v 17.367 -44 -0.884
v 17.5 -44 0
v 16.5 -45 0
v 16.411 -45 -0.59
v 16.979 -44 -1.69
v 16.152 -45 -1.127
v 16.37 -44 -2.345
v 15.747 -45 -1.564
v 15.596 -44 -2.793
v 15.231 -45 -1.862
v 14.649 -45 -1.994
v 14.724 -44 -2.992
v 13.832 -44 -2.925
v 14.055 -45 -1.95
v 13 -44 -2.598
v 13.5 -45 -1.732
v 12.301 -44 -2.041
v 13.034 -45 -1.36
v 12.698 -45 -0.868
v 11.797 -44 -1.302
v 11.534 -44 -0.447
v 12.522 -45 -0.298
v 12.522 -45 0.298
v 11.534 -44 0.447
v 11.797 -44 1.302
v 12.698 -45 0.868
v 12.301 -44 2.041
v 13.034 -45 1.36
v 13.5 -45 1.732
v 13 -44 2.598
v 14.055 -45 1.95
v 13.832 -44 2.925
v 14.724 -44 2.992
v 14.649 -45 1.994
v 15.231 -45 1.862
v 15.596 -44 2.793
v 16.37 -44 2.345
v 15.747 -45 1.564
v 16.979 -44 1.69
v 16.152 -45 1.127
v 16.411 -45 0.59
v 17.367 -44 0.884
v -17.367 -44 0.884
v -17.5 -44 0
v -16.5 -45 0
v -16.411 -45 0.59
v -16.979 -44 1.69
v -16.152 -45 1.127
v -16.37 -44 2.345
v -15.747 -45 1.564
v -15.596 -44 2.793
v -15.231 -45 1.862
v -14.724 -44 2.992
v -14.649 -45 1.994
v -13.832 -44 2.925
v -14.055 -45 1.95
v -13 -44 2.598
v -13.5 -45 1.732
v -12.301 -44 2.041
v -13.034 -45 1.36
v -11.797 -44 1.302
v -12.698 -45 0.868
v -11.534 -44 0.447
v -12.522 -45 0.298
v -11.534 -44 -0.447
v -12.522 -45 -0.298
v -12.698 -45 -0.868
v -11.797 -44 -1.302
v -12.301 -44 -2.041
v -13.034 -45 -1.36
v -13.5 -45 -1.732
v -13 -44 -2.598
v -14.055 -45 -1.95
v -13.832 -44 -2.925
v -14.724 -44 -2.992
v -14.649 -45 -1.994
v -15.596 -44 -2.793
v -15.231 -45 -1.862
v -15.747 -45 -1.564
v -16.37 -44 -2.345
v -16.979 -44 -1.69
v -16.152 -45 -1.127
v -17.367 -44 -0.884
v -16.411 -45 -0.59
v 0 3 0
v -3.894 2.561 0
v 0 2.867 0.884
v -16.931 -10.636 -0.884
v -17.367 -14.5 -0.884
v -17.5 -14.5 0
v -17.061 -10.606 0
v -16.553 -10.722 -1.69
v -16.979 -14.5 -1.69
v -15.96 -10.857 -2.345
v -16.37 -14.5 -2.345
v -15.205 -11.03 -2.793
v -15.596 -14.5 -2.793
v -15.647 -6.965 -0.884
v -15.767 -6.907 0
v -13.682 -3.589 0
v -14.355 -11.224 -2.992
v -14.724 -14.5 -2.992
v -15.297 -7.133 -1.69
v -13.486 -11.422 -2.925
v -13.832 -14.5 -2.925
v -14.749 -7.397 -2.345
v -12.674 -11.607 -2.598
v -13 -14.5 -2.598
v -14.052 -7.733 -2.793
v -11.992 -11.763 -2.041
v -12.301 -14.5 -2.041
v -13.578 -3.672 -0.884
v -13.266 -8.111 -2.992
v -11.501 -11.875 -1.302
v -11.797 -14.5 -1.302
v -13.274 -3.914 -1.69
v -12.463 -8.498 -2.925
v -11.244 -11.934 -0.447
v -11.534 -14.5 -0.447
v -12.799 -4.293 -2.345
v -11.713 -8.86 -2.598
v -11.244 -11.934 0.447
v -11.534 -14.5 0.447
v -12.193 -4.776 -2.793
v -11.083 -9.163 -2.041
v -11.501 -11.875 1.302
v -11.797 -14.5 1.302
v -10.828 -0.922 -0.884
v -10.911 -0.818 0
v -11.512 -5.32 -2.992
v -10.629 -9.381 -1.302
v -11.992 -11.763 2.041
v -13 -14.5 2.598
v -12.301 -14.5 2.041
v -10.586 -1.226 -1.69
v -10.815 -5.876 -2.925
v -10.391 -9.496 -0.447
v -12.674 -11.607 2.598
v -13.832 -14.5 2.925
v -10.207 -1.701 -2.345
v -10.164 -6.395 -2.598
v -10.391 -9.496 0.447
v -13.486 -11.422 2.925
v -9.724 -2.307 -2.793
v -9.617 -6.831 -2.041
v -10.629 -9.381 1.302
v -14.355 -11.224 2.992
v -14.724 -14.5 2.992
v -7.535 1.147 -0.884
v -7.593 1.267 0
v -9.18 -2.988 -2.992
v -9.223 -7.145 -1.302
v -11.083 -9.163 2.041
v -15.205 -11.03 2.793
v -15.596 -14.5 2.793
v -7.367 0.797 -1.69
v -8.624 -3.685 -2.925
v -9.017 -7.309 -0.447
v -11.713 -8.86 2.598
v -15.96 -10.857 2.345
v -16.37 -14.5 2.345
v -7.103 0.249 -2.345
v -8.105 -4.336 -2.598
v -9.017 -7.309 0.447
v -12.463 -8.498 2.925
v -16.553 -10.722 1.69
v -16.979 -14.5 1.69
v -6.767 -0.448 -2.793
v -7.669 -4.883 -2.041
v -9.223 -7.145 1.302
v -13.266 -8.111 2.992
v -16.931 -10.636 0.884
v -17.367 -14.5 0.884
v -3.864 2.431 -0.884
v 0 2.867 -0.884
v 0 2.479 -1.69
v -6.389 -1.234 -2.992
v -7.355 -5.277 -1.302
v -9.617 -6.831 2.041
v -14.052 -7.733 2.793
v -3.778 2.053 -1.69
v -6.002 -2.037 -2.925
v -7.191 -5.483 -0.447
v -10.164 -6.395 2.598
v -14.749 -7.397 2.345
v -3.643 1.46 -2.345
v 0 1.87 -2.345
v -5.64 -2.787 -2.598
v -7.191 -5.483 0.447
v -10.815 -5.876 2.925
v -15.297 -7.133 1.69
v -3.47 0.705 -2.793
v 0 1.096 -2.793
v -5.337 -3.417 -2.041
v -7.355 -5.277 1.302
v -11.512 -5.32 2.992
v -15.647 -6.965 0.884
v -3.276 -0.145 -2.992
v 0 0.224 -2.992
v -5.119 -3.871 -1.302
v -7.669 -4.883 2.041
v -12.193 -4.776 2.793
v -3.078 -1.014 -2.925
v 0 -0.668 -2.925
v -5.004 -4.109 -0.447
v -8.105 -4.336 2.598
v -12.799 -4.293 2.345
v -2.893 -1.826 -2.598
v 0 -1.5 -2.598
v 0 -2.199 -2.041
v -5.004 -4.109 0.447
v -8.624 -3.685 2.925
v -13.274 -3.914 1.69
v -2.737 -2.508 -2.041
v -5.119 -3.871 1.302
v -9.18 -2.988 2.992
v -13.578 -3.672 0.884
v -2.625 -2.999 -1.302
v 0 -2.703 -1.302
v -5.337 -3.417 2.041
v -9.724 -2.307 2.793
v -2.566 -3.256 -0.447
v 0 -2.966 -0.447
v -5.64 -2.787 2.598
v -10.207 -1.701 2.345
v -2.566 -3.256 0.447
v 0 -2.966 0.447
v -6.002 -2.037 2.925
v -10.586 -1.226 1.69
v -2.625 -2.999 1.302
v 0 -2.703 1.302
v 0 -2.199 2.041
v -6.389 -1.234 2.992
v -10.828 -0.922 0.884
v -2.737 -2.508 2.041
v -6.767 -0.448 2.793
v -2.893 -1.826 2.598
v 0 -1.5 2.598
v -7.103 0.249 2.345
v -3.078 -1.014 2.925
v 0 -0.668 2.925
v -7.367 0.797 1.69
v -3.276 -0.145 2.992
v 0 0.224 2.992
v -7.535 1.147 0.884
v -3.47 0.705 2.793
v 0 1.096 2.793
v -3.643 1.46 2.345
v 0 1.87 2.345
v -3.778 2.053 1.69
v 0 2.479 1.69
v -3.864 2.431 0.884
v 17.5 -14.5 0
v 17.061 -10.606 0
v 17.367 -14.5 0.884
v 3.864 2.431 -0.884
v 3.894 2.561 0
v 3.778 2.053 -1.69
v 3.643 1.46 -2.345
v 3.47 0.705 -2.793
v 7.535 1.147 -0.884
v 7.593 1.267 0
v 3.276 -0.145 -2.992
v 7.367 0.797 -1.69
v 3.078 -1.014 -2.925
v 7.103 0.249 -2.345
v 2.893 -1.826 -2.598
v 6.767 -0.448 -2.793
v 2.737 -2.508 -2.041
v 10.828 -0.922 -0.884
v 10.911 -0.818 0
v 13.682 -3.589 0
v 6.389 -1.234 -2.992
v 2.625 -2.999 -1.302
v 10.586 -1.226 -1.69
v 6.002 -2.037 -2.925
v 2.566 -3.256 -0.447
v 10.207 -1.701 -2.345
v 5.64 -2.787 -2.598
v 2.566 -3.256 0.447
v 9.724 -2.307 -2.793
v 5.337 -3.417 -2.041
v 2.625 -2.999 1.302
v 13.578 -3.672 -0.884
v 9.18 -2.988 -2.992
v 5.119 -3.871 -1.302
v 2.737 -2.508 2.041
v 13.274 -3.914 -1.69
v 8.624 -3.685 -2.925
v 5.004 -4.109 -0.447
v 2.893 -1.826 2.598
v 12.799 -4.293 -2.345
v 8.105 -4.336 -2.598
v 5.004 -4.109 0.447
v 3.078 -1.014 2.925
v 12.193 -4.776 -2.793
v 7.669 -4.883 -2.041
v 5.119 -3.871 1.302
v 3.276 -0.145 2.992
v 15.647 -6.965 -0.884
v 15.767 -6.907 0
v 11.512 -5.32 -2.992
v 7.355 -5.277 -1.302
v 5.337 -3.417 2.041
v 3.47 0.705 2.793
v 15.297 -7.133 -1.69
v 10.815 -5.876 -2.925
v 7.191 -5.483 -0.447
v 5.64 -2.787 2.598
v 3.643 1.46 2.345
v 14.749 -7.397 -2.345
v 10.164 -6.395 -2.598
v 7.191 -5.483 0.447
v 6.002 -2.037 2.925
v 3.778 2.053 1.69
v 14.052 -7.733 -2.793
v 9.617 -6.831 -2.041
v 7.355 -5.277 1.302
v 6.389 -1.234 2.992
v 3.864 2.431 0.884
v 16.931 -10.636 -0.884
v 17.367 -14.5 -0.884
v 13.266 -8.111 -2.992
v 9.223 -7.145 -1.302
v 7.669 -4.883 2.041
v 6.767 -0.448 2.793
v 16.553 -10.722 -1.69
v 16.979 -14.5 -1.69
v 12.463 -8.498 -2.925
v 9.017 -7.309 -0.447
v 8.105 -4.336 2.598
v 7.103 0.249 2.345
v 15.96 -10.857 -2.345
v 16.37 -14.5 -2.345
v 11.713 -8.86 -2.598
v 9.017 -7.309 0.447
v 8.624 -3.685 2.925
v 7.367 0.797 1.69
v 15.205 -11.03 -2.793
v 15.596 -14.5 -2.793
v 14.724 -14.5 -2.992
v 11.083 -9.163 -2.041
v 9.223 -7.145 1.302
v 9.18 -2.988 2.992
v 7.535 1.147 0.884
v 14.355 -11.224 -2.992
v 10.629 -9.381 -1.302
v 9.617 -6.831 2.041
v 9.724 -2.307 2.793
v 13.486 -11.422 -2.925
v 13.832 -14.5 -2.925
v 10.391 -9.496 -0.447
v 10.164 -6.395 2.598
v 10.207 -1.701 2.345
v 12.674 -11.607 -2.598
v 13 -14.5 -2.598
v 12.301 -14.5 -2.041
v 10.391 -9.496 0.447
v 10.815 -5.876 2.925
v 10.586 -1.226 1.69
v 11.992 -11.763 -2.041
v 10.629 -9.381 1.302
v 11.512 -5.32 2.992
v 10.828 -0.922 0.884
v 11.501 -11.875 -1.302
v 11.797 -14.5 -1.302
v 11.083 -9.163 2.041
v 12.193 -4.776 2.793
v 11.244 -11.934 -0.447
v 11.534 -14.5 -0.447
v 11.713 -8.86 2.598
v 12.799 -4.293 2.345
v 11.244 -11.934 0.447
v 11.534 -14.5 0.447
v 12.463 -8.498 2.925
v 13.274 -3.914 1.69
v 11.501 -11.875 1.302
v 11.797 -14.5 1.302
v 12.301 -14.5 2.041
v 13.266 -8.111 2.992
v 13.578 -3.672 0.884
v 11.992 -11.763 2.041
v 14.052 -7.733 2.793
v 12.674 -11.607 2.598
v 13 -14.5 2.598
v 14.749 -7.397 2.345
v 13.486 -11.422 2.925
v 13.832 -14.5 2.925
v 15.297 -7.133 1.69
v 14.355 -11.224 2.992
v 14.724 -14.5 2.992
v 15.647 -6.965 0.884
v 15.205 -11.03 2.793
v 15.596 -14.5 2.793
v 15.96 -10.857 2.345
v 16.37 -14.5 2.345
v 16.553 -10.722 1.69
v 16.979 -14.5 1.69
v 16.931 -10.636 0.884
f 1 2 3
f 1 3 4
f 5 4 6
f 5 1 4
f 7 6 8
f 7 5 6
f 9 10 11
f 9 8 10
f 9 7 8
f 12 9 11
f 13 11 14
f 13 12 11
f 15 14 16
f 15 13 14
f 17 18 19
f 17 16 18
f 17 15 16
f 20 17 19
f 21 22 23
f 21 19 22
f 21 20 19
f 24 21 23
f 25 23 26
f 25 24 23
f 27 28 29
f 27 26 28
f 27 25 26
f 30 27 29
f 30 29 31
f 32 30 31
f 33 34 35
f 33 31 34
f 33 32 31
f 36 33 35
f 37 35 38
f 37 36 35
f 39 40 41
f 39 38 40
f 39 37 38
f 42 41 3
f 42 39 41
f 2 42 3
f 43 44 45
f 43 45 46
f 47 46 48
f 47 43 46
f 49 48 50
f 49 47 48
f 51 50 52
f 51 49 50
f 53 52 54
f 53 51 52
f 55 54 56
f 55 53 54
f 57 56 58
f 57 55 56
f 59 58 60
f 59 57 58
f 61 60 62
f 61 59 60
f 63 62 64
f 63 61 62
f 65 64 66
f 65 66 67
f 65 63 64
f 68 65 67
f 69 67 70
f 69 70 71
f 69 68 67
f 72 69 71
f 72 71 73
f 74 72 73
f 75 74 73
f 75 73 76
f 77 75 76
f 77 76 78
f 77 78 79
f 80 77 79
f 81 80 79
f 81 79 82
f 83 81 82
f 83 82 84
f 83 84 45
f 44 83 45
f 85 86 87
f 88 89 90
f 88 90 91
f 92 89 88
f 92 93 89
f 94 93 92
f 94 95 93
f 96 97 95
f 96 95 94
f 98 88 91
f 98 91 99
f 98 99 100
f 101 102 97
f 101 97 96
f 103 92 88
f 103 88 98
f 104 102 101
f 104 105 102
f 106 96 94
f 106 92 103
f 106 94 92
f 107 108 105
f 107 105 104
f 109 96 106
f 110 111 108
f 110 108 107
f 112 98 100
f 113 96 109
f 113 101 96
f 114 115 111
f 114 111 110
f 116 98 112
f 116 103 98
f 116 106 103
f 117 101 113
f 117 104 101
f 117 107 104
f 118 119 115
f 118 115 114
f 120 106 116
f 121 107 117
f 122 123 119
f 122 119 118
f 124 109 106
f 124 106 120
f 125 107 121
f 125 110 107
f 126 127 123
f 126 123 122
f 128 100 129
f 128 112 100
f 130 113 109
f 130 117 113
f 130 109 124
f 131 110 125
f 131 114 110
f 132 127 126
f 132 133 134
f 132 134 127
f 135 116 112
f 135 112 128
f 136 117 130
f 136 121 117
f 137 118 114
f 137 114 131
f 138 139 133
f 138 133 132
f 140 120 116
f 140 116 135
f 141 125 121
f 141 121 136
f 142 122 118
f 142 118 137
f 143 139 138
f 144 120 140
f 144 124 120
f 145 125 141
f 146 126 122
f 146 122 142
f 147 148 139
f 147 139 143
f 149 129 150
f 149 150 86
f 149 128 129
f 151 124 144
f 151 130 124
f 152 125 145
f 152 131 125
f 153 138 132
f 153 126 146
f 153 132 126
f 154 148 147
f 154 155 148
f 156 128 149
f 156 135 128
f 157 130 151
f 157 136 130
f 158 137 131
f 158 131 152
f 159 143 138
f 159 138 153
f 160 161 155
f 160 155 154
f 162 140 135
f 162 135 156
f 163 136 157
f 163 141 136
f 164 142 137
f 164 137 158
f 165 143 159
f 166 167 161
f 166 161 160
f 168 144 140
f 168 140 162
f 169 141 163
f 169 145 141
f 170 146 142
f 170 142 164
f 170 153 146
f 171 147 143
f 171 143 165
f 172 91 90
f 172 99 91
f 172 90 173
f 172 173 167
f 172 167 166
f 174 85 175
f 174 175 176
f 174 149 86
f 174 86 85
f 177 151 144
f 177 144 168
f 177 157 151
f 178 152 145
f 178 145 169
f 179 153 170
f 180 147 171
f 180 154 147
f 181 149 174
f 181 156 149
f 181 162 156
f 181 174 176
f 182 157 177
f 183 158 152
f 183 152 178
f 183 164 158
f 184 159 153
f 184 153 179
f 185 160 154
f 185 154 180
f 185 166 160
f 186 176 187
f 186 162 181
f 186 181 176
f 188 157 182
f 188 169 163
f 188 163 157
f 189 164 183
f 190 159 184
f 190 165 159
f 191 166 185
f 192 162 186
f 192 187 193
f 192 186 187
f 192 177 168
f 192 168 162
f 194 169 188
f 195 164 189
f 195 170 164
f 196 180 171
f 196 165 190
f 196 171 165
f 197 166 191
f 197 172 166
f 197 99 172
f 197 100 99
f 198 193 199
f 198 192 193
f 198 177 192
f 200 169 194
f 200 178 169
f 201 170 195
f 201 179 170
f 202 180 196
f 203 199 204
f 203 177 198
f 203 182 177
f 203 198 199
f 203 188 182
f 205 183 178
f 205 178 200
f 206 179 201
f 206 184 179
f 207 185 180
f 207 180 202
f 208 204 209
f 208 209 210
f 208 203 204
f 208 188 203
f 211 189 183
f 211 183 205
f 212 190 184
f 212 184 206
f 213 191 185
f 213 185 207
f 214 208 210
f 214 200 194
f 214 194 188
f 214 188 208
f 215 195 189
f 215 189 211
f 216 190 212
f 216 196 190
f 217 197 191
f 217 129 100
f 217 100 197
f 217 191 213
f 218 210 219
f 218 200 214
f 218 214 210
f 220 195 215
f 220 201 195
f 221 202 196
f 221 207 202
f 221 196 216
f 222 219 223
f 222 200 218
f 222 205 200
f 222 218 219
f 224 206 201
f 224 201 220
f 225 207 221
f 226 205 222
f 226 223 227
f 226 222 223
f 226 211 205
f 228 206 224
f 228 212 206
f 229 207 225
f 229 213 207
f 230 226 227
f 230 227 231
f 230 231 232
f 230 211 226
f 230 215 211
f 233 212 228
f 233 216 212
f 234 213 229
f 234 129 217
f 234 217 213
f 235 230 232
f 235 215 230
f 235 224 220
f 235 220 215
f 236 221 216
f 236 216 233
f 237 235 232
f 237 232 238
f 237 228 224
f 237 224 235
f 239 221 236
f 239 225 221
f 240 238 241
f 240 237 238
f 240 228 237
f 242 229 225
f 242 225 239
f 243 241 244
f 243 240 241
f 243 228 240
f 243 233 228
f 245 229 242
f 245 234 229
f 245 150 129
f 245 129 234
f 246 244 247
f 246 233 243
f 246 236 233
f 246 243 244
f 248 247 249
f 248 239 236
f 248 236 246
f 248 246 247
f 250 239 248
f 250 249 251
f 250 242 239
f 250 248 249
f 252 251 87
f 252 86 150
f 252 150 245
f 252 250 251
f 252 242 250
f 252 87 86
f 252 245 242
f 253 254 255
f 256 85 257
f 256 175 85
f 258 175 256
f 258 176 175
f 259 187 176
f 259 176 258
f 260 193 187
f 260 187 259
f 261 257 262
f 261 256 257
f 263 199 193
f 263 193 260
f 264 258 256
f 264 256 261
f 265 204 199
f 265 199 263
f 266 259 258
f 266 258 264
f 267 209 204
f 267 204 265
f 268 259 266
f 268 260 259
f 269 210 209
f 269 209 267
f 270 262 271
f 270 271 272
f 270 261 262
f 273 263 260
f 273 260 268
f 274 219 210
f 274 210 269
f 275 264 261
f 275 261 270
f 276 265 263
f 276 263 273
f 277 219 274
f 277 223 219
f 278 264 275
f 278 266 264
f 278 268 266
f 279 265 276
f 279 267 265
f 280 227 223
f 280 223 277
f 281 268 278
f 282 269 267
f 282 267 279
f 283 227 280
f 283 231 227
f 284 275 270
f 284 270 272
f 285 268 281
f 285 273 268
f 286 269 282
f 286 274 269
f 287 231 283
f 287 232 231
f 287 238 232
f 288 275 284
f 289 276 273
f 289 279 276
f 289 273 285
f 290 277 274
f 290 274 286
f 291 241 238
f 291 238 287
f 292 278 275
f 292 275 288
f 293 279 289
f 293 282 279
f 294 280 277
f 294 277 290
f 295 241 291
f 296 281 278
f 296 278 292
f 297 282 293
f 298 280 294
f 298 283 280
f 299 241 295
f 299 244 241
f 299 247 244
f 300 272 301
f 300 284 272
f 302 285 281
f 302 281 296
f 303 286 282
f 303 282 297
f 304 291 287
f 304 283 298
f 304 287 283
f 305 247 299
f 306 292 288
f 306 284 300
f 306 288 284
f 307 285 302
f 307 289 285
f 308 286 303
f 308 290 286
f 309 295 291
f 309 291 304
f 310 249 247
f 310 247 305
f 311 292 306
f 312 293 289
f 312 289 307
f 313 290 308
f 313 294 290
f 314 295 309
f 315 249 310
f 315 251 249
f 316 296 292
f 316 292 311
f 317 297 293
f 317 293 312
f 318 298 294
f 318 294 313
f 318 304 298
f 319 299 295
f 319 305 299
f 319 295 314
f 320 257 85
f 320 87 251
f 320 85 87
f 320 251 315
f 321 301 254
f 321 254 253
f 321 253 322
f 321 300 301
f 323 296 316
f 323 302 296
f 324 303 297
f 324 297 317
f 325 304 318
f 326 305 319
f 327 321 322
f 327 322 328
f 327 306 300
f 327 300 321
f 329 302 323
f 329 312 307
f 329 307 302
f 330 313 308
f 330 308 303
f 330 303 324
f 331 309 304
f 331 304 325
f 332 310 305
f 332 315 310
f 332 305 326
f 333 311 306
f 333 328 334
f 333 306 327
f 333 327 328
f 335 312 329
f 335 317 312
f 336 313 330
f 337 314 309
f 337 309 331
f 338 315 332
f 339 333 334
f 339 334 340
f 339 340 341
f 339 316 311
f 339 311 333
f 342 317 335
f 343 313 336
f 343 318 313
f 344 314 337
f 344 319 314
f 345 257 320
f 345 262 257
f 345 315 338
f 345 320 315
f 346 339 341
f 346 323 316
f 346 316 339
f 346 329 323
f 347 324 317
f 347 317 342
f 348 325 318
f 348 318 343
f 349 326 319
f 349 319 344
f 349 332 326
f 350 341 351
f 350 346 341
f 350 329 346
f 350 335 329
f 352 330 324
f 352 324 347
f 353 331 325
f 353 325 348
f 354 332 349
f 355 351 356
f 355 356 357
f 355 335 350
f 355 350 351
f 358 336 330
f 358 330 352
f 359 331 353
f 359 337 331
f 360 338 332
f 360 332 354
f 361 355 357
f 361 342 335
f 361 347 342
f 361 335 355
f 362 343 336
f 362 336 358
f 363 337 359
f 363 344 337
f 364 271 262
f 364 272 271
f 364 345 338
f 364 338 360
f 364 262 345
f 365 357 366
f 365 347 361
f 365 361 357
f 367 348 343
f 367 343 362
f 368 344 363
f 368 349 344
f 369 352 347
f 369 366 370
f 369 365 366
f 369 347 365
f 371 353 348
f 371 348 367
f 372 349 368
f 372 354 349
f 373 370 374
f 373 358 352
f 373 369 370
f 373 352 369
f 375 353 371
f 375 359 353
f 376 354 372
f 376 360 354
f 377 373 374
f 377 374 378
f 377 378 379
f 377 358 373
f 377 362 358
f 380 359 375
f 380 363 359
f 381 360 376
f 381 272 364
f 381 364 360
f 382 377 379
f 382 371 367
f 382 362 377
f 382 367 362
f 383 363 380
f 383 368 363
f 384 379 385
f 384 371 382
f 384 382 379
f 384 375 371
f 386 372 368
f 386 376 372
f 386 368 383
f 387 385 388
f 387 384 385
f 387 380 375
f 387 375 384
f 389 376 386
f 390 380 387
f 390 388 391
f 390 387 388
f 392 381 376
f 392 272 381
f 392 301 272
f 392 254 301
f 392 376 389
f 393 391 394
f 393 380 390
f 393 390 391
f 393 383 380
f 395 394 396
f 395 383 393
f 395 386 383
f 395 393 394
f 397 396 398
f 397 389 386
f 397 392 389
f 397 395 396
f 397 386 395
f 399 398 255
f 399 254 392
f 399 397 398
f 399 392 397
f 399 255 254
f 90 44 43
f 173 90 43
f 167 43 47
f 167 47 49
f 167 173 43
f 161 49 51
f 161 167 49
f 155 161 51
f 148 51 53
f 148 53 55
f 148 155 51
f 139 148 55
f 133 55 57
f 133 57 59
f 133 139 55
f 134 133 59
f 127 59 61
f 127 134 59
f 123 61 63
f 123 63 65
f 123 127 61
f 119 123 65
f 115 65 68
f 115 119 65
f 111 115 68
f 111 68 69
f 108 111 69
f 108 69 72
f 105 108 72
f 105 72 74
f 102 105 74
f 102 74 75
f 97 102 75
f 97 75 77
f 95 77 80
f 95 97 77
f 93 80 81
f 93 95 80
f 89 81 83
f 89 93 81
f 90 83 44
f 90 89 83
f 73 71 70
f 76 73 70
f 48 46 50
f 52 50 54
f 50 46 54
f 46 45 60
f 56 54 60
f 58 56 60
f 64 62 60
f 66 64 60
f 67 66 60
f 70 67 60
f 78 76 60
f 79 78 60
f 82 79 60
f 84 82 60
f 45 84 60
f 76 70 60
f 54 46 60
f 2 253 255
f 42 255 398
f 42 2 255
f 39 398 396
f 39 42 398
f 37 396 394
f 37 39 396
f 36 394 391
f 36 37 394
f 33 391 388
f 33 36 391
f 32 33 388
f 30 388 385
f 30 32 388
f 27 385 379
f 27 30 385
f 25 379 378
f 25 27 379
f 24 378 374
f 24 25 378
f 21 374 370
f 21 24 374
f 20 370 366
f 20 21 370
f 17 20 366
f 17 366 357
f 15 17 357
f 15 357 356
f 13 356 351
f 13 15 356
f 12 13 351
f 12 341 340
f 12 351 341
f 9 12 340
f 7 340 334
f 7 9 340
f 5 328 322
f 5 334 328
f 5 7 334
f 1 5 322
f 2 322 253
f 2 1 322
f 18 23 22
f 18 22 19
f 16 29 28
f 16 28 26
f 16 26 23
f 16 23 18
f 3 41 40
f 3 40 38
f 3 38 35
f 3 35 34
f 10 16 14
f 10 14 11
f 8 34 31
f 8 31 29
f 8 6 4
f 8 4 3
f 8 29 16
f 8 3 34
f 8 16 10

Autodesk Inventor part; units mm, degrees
ref_plane "YZ Plane" through (0, 0, 0) normal (1, 0, 0) x (0, 1, 0)
ref_plane "XZ Plane" through (0, 0, 0) normal (0, 1, 0) x (-1, 0, 0)
ref_plane "XY Plane" through (0, 0, 0) normal (0, 0, 1) x (1, 0, 0)
sketch "Náčrt5" plane through (0, 0, 0) normal (1, 0, 0) x (0, 1, 0)
  circle A0 centre (0, 0) radius 3
  dimension "d23" = 6
sketch "Náčrt6" plane through (0, 0, 0) normal (0, 0, 1) x (1, 0, 0)
  line L0 (-14.5, -45) -> (-14.5, -14.5)
  line L1 (0, 0) -> (0, 0)
  line L2 (14.5, -14.5) -> (14.5, -45)
  line L3 (-14.5, -45) -> (14.5, -45) construction
  arc A0 (0, 0) -> (-14.5, -14.5) centre (0, -14.5) ccw
  arc A1 (14.5, -14.5) -> (0, 0) centre (0, -14.5) ccw
  point P0 (0, 0)
  point P1 (14.5, 0)
  point P2 (0, 0)
  dimension "d46" = 29
  dimension "d47" = 45
  dimension "d48" = 14.5
sweep "Tažení4" add profiles "Náčrt5" path "Náčrt6"
chamfer "Zkosení4" distance 1 angle 45 5 edges at (-11.5, -45, 0) (-11.5, -14.5, 0) (0, -3, 0) (11.5, -14.5, 0) (11.5, -45, 0)
equation "\"d48\" = 0.5 * d46"
properties part number "DD_KVD_002_14" material "Nerezová ocel"
